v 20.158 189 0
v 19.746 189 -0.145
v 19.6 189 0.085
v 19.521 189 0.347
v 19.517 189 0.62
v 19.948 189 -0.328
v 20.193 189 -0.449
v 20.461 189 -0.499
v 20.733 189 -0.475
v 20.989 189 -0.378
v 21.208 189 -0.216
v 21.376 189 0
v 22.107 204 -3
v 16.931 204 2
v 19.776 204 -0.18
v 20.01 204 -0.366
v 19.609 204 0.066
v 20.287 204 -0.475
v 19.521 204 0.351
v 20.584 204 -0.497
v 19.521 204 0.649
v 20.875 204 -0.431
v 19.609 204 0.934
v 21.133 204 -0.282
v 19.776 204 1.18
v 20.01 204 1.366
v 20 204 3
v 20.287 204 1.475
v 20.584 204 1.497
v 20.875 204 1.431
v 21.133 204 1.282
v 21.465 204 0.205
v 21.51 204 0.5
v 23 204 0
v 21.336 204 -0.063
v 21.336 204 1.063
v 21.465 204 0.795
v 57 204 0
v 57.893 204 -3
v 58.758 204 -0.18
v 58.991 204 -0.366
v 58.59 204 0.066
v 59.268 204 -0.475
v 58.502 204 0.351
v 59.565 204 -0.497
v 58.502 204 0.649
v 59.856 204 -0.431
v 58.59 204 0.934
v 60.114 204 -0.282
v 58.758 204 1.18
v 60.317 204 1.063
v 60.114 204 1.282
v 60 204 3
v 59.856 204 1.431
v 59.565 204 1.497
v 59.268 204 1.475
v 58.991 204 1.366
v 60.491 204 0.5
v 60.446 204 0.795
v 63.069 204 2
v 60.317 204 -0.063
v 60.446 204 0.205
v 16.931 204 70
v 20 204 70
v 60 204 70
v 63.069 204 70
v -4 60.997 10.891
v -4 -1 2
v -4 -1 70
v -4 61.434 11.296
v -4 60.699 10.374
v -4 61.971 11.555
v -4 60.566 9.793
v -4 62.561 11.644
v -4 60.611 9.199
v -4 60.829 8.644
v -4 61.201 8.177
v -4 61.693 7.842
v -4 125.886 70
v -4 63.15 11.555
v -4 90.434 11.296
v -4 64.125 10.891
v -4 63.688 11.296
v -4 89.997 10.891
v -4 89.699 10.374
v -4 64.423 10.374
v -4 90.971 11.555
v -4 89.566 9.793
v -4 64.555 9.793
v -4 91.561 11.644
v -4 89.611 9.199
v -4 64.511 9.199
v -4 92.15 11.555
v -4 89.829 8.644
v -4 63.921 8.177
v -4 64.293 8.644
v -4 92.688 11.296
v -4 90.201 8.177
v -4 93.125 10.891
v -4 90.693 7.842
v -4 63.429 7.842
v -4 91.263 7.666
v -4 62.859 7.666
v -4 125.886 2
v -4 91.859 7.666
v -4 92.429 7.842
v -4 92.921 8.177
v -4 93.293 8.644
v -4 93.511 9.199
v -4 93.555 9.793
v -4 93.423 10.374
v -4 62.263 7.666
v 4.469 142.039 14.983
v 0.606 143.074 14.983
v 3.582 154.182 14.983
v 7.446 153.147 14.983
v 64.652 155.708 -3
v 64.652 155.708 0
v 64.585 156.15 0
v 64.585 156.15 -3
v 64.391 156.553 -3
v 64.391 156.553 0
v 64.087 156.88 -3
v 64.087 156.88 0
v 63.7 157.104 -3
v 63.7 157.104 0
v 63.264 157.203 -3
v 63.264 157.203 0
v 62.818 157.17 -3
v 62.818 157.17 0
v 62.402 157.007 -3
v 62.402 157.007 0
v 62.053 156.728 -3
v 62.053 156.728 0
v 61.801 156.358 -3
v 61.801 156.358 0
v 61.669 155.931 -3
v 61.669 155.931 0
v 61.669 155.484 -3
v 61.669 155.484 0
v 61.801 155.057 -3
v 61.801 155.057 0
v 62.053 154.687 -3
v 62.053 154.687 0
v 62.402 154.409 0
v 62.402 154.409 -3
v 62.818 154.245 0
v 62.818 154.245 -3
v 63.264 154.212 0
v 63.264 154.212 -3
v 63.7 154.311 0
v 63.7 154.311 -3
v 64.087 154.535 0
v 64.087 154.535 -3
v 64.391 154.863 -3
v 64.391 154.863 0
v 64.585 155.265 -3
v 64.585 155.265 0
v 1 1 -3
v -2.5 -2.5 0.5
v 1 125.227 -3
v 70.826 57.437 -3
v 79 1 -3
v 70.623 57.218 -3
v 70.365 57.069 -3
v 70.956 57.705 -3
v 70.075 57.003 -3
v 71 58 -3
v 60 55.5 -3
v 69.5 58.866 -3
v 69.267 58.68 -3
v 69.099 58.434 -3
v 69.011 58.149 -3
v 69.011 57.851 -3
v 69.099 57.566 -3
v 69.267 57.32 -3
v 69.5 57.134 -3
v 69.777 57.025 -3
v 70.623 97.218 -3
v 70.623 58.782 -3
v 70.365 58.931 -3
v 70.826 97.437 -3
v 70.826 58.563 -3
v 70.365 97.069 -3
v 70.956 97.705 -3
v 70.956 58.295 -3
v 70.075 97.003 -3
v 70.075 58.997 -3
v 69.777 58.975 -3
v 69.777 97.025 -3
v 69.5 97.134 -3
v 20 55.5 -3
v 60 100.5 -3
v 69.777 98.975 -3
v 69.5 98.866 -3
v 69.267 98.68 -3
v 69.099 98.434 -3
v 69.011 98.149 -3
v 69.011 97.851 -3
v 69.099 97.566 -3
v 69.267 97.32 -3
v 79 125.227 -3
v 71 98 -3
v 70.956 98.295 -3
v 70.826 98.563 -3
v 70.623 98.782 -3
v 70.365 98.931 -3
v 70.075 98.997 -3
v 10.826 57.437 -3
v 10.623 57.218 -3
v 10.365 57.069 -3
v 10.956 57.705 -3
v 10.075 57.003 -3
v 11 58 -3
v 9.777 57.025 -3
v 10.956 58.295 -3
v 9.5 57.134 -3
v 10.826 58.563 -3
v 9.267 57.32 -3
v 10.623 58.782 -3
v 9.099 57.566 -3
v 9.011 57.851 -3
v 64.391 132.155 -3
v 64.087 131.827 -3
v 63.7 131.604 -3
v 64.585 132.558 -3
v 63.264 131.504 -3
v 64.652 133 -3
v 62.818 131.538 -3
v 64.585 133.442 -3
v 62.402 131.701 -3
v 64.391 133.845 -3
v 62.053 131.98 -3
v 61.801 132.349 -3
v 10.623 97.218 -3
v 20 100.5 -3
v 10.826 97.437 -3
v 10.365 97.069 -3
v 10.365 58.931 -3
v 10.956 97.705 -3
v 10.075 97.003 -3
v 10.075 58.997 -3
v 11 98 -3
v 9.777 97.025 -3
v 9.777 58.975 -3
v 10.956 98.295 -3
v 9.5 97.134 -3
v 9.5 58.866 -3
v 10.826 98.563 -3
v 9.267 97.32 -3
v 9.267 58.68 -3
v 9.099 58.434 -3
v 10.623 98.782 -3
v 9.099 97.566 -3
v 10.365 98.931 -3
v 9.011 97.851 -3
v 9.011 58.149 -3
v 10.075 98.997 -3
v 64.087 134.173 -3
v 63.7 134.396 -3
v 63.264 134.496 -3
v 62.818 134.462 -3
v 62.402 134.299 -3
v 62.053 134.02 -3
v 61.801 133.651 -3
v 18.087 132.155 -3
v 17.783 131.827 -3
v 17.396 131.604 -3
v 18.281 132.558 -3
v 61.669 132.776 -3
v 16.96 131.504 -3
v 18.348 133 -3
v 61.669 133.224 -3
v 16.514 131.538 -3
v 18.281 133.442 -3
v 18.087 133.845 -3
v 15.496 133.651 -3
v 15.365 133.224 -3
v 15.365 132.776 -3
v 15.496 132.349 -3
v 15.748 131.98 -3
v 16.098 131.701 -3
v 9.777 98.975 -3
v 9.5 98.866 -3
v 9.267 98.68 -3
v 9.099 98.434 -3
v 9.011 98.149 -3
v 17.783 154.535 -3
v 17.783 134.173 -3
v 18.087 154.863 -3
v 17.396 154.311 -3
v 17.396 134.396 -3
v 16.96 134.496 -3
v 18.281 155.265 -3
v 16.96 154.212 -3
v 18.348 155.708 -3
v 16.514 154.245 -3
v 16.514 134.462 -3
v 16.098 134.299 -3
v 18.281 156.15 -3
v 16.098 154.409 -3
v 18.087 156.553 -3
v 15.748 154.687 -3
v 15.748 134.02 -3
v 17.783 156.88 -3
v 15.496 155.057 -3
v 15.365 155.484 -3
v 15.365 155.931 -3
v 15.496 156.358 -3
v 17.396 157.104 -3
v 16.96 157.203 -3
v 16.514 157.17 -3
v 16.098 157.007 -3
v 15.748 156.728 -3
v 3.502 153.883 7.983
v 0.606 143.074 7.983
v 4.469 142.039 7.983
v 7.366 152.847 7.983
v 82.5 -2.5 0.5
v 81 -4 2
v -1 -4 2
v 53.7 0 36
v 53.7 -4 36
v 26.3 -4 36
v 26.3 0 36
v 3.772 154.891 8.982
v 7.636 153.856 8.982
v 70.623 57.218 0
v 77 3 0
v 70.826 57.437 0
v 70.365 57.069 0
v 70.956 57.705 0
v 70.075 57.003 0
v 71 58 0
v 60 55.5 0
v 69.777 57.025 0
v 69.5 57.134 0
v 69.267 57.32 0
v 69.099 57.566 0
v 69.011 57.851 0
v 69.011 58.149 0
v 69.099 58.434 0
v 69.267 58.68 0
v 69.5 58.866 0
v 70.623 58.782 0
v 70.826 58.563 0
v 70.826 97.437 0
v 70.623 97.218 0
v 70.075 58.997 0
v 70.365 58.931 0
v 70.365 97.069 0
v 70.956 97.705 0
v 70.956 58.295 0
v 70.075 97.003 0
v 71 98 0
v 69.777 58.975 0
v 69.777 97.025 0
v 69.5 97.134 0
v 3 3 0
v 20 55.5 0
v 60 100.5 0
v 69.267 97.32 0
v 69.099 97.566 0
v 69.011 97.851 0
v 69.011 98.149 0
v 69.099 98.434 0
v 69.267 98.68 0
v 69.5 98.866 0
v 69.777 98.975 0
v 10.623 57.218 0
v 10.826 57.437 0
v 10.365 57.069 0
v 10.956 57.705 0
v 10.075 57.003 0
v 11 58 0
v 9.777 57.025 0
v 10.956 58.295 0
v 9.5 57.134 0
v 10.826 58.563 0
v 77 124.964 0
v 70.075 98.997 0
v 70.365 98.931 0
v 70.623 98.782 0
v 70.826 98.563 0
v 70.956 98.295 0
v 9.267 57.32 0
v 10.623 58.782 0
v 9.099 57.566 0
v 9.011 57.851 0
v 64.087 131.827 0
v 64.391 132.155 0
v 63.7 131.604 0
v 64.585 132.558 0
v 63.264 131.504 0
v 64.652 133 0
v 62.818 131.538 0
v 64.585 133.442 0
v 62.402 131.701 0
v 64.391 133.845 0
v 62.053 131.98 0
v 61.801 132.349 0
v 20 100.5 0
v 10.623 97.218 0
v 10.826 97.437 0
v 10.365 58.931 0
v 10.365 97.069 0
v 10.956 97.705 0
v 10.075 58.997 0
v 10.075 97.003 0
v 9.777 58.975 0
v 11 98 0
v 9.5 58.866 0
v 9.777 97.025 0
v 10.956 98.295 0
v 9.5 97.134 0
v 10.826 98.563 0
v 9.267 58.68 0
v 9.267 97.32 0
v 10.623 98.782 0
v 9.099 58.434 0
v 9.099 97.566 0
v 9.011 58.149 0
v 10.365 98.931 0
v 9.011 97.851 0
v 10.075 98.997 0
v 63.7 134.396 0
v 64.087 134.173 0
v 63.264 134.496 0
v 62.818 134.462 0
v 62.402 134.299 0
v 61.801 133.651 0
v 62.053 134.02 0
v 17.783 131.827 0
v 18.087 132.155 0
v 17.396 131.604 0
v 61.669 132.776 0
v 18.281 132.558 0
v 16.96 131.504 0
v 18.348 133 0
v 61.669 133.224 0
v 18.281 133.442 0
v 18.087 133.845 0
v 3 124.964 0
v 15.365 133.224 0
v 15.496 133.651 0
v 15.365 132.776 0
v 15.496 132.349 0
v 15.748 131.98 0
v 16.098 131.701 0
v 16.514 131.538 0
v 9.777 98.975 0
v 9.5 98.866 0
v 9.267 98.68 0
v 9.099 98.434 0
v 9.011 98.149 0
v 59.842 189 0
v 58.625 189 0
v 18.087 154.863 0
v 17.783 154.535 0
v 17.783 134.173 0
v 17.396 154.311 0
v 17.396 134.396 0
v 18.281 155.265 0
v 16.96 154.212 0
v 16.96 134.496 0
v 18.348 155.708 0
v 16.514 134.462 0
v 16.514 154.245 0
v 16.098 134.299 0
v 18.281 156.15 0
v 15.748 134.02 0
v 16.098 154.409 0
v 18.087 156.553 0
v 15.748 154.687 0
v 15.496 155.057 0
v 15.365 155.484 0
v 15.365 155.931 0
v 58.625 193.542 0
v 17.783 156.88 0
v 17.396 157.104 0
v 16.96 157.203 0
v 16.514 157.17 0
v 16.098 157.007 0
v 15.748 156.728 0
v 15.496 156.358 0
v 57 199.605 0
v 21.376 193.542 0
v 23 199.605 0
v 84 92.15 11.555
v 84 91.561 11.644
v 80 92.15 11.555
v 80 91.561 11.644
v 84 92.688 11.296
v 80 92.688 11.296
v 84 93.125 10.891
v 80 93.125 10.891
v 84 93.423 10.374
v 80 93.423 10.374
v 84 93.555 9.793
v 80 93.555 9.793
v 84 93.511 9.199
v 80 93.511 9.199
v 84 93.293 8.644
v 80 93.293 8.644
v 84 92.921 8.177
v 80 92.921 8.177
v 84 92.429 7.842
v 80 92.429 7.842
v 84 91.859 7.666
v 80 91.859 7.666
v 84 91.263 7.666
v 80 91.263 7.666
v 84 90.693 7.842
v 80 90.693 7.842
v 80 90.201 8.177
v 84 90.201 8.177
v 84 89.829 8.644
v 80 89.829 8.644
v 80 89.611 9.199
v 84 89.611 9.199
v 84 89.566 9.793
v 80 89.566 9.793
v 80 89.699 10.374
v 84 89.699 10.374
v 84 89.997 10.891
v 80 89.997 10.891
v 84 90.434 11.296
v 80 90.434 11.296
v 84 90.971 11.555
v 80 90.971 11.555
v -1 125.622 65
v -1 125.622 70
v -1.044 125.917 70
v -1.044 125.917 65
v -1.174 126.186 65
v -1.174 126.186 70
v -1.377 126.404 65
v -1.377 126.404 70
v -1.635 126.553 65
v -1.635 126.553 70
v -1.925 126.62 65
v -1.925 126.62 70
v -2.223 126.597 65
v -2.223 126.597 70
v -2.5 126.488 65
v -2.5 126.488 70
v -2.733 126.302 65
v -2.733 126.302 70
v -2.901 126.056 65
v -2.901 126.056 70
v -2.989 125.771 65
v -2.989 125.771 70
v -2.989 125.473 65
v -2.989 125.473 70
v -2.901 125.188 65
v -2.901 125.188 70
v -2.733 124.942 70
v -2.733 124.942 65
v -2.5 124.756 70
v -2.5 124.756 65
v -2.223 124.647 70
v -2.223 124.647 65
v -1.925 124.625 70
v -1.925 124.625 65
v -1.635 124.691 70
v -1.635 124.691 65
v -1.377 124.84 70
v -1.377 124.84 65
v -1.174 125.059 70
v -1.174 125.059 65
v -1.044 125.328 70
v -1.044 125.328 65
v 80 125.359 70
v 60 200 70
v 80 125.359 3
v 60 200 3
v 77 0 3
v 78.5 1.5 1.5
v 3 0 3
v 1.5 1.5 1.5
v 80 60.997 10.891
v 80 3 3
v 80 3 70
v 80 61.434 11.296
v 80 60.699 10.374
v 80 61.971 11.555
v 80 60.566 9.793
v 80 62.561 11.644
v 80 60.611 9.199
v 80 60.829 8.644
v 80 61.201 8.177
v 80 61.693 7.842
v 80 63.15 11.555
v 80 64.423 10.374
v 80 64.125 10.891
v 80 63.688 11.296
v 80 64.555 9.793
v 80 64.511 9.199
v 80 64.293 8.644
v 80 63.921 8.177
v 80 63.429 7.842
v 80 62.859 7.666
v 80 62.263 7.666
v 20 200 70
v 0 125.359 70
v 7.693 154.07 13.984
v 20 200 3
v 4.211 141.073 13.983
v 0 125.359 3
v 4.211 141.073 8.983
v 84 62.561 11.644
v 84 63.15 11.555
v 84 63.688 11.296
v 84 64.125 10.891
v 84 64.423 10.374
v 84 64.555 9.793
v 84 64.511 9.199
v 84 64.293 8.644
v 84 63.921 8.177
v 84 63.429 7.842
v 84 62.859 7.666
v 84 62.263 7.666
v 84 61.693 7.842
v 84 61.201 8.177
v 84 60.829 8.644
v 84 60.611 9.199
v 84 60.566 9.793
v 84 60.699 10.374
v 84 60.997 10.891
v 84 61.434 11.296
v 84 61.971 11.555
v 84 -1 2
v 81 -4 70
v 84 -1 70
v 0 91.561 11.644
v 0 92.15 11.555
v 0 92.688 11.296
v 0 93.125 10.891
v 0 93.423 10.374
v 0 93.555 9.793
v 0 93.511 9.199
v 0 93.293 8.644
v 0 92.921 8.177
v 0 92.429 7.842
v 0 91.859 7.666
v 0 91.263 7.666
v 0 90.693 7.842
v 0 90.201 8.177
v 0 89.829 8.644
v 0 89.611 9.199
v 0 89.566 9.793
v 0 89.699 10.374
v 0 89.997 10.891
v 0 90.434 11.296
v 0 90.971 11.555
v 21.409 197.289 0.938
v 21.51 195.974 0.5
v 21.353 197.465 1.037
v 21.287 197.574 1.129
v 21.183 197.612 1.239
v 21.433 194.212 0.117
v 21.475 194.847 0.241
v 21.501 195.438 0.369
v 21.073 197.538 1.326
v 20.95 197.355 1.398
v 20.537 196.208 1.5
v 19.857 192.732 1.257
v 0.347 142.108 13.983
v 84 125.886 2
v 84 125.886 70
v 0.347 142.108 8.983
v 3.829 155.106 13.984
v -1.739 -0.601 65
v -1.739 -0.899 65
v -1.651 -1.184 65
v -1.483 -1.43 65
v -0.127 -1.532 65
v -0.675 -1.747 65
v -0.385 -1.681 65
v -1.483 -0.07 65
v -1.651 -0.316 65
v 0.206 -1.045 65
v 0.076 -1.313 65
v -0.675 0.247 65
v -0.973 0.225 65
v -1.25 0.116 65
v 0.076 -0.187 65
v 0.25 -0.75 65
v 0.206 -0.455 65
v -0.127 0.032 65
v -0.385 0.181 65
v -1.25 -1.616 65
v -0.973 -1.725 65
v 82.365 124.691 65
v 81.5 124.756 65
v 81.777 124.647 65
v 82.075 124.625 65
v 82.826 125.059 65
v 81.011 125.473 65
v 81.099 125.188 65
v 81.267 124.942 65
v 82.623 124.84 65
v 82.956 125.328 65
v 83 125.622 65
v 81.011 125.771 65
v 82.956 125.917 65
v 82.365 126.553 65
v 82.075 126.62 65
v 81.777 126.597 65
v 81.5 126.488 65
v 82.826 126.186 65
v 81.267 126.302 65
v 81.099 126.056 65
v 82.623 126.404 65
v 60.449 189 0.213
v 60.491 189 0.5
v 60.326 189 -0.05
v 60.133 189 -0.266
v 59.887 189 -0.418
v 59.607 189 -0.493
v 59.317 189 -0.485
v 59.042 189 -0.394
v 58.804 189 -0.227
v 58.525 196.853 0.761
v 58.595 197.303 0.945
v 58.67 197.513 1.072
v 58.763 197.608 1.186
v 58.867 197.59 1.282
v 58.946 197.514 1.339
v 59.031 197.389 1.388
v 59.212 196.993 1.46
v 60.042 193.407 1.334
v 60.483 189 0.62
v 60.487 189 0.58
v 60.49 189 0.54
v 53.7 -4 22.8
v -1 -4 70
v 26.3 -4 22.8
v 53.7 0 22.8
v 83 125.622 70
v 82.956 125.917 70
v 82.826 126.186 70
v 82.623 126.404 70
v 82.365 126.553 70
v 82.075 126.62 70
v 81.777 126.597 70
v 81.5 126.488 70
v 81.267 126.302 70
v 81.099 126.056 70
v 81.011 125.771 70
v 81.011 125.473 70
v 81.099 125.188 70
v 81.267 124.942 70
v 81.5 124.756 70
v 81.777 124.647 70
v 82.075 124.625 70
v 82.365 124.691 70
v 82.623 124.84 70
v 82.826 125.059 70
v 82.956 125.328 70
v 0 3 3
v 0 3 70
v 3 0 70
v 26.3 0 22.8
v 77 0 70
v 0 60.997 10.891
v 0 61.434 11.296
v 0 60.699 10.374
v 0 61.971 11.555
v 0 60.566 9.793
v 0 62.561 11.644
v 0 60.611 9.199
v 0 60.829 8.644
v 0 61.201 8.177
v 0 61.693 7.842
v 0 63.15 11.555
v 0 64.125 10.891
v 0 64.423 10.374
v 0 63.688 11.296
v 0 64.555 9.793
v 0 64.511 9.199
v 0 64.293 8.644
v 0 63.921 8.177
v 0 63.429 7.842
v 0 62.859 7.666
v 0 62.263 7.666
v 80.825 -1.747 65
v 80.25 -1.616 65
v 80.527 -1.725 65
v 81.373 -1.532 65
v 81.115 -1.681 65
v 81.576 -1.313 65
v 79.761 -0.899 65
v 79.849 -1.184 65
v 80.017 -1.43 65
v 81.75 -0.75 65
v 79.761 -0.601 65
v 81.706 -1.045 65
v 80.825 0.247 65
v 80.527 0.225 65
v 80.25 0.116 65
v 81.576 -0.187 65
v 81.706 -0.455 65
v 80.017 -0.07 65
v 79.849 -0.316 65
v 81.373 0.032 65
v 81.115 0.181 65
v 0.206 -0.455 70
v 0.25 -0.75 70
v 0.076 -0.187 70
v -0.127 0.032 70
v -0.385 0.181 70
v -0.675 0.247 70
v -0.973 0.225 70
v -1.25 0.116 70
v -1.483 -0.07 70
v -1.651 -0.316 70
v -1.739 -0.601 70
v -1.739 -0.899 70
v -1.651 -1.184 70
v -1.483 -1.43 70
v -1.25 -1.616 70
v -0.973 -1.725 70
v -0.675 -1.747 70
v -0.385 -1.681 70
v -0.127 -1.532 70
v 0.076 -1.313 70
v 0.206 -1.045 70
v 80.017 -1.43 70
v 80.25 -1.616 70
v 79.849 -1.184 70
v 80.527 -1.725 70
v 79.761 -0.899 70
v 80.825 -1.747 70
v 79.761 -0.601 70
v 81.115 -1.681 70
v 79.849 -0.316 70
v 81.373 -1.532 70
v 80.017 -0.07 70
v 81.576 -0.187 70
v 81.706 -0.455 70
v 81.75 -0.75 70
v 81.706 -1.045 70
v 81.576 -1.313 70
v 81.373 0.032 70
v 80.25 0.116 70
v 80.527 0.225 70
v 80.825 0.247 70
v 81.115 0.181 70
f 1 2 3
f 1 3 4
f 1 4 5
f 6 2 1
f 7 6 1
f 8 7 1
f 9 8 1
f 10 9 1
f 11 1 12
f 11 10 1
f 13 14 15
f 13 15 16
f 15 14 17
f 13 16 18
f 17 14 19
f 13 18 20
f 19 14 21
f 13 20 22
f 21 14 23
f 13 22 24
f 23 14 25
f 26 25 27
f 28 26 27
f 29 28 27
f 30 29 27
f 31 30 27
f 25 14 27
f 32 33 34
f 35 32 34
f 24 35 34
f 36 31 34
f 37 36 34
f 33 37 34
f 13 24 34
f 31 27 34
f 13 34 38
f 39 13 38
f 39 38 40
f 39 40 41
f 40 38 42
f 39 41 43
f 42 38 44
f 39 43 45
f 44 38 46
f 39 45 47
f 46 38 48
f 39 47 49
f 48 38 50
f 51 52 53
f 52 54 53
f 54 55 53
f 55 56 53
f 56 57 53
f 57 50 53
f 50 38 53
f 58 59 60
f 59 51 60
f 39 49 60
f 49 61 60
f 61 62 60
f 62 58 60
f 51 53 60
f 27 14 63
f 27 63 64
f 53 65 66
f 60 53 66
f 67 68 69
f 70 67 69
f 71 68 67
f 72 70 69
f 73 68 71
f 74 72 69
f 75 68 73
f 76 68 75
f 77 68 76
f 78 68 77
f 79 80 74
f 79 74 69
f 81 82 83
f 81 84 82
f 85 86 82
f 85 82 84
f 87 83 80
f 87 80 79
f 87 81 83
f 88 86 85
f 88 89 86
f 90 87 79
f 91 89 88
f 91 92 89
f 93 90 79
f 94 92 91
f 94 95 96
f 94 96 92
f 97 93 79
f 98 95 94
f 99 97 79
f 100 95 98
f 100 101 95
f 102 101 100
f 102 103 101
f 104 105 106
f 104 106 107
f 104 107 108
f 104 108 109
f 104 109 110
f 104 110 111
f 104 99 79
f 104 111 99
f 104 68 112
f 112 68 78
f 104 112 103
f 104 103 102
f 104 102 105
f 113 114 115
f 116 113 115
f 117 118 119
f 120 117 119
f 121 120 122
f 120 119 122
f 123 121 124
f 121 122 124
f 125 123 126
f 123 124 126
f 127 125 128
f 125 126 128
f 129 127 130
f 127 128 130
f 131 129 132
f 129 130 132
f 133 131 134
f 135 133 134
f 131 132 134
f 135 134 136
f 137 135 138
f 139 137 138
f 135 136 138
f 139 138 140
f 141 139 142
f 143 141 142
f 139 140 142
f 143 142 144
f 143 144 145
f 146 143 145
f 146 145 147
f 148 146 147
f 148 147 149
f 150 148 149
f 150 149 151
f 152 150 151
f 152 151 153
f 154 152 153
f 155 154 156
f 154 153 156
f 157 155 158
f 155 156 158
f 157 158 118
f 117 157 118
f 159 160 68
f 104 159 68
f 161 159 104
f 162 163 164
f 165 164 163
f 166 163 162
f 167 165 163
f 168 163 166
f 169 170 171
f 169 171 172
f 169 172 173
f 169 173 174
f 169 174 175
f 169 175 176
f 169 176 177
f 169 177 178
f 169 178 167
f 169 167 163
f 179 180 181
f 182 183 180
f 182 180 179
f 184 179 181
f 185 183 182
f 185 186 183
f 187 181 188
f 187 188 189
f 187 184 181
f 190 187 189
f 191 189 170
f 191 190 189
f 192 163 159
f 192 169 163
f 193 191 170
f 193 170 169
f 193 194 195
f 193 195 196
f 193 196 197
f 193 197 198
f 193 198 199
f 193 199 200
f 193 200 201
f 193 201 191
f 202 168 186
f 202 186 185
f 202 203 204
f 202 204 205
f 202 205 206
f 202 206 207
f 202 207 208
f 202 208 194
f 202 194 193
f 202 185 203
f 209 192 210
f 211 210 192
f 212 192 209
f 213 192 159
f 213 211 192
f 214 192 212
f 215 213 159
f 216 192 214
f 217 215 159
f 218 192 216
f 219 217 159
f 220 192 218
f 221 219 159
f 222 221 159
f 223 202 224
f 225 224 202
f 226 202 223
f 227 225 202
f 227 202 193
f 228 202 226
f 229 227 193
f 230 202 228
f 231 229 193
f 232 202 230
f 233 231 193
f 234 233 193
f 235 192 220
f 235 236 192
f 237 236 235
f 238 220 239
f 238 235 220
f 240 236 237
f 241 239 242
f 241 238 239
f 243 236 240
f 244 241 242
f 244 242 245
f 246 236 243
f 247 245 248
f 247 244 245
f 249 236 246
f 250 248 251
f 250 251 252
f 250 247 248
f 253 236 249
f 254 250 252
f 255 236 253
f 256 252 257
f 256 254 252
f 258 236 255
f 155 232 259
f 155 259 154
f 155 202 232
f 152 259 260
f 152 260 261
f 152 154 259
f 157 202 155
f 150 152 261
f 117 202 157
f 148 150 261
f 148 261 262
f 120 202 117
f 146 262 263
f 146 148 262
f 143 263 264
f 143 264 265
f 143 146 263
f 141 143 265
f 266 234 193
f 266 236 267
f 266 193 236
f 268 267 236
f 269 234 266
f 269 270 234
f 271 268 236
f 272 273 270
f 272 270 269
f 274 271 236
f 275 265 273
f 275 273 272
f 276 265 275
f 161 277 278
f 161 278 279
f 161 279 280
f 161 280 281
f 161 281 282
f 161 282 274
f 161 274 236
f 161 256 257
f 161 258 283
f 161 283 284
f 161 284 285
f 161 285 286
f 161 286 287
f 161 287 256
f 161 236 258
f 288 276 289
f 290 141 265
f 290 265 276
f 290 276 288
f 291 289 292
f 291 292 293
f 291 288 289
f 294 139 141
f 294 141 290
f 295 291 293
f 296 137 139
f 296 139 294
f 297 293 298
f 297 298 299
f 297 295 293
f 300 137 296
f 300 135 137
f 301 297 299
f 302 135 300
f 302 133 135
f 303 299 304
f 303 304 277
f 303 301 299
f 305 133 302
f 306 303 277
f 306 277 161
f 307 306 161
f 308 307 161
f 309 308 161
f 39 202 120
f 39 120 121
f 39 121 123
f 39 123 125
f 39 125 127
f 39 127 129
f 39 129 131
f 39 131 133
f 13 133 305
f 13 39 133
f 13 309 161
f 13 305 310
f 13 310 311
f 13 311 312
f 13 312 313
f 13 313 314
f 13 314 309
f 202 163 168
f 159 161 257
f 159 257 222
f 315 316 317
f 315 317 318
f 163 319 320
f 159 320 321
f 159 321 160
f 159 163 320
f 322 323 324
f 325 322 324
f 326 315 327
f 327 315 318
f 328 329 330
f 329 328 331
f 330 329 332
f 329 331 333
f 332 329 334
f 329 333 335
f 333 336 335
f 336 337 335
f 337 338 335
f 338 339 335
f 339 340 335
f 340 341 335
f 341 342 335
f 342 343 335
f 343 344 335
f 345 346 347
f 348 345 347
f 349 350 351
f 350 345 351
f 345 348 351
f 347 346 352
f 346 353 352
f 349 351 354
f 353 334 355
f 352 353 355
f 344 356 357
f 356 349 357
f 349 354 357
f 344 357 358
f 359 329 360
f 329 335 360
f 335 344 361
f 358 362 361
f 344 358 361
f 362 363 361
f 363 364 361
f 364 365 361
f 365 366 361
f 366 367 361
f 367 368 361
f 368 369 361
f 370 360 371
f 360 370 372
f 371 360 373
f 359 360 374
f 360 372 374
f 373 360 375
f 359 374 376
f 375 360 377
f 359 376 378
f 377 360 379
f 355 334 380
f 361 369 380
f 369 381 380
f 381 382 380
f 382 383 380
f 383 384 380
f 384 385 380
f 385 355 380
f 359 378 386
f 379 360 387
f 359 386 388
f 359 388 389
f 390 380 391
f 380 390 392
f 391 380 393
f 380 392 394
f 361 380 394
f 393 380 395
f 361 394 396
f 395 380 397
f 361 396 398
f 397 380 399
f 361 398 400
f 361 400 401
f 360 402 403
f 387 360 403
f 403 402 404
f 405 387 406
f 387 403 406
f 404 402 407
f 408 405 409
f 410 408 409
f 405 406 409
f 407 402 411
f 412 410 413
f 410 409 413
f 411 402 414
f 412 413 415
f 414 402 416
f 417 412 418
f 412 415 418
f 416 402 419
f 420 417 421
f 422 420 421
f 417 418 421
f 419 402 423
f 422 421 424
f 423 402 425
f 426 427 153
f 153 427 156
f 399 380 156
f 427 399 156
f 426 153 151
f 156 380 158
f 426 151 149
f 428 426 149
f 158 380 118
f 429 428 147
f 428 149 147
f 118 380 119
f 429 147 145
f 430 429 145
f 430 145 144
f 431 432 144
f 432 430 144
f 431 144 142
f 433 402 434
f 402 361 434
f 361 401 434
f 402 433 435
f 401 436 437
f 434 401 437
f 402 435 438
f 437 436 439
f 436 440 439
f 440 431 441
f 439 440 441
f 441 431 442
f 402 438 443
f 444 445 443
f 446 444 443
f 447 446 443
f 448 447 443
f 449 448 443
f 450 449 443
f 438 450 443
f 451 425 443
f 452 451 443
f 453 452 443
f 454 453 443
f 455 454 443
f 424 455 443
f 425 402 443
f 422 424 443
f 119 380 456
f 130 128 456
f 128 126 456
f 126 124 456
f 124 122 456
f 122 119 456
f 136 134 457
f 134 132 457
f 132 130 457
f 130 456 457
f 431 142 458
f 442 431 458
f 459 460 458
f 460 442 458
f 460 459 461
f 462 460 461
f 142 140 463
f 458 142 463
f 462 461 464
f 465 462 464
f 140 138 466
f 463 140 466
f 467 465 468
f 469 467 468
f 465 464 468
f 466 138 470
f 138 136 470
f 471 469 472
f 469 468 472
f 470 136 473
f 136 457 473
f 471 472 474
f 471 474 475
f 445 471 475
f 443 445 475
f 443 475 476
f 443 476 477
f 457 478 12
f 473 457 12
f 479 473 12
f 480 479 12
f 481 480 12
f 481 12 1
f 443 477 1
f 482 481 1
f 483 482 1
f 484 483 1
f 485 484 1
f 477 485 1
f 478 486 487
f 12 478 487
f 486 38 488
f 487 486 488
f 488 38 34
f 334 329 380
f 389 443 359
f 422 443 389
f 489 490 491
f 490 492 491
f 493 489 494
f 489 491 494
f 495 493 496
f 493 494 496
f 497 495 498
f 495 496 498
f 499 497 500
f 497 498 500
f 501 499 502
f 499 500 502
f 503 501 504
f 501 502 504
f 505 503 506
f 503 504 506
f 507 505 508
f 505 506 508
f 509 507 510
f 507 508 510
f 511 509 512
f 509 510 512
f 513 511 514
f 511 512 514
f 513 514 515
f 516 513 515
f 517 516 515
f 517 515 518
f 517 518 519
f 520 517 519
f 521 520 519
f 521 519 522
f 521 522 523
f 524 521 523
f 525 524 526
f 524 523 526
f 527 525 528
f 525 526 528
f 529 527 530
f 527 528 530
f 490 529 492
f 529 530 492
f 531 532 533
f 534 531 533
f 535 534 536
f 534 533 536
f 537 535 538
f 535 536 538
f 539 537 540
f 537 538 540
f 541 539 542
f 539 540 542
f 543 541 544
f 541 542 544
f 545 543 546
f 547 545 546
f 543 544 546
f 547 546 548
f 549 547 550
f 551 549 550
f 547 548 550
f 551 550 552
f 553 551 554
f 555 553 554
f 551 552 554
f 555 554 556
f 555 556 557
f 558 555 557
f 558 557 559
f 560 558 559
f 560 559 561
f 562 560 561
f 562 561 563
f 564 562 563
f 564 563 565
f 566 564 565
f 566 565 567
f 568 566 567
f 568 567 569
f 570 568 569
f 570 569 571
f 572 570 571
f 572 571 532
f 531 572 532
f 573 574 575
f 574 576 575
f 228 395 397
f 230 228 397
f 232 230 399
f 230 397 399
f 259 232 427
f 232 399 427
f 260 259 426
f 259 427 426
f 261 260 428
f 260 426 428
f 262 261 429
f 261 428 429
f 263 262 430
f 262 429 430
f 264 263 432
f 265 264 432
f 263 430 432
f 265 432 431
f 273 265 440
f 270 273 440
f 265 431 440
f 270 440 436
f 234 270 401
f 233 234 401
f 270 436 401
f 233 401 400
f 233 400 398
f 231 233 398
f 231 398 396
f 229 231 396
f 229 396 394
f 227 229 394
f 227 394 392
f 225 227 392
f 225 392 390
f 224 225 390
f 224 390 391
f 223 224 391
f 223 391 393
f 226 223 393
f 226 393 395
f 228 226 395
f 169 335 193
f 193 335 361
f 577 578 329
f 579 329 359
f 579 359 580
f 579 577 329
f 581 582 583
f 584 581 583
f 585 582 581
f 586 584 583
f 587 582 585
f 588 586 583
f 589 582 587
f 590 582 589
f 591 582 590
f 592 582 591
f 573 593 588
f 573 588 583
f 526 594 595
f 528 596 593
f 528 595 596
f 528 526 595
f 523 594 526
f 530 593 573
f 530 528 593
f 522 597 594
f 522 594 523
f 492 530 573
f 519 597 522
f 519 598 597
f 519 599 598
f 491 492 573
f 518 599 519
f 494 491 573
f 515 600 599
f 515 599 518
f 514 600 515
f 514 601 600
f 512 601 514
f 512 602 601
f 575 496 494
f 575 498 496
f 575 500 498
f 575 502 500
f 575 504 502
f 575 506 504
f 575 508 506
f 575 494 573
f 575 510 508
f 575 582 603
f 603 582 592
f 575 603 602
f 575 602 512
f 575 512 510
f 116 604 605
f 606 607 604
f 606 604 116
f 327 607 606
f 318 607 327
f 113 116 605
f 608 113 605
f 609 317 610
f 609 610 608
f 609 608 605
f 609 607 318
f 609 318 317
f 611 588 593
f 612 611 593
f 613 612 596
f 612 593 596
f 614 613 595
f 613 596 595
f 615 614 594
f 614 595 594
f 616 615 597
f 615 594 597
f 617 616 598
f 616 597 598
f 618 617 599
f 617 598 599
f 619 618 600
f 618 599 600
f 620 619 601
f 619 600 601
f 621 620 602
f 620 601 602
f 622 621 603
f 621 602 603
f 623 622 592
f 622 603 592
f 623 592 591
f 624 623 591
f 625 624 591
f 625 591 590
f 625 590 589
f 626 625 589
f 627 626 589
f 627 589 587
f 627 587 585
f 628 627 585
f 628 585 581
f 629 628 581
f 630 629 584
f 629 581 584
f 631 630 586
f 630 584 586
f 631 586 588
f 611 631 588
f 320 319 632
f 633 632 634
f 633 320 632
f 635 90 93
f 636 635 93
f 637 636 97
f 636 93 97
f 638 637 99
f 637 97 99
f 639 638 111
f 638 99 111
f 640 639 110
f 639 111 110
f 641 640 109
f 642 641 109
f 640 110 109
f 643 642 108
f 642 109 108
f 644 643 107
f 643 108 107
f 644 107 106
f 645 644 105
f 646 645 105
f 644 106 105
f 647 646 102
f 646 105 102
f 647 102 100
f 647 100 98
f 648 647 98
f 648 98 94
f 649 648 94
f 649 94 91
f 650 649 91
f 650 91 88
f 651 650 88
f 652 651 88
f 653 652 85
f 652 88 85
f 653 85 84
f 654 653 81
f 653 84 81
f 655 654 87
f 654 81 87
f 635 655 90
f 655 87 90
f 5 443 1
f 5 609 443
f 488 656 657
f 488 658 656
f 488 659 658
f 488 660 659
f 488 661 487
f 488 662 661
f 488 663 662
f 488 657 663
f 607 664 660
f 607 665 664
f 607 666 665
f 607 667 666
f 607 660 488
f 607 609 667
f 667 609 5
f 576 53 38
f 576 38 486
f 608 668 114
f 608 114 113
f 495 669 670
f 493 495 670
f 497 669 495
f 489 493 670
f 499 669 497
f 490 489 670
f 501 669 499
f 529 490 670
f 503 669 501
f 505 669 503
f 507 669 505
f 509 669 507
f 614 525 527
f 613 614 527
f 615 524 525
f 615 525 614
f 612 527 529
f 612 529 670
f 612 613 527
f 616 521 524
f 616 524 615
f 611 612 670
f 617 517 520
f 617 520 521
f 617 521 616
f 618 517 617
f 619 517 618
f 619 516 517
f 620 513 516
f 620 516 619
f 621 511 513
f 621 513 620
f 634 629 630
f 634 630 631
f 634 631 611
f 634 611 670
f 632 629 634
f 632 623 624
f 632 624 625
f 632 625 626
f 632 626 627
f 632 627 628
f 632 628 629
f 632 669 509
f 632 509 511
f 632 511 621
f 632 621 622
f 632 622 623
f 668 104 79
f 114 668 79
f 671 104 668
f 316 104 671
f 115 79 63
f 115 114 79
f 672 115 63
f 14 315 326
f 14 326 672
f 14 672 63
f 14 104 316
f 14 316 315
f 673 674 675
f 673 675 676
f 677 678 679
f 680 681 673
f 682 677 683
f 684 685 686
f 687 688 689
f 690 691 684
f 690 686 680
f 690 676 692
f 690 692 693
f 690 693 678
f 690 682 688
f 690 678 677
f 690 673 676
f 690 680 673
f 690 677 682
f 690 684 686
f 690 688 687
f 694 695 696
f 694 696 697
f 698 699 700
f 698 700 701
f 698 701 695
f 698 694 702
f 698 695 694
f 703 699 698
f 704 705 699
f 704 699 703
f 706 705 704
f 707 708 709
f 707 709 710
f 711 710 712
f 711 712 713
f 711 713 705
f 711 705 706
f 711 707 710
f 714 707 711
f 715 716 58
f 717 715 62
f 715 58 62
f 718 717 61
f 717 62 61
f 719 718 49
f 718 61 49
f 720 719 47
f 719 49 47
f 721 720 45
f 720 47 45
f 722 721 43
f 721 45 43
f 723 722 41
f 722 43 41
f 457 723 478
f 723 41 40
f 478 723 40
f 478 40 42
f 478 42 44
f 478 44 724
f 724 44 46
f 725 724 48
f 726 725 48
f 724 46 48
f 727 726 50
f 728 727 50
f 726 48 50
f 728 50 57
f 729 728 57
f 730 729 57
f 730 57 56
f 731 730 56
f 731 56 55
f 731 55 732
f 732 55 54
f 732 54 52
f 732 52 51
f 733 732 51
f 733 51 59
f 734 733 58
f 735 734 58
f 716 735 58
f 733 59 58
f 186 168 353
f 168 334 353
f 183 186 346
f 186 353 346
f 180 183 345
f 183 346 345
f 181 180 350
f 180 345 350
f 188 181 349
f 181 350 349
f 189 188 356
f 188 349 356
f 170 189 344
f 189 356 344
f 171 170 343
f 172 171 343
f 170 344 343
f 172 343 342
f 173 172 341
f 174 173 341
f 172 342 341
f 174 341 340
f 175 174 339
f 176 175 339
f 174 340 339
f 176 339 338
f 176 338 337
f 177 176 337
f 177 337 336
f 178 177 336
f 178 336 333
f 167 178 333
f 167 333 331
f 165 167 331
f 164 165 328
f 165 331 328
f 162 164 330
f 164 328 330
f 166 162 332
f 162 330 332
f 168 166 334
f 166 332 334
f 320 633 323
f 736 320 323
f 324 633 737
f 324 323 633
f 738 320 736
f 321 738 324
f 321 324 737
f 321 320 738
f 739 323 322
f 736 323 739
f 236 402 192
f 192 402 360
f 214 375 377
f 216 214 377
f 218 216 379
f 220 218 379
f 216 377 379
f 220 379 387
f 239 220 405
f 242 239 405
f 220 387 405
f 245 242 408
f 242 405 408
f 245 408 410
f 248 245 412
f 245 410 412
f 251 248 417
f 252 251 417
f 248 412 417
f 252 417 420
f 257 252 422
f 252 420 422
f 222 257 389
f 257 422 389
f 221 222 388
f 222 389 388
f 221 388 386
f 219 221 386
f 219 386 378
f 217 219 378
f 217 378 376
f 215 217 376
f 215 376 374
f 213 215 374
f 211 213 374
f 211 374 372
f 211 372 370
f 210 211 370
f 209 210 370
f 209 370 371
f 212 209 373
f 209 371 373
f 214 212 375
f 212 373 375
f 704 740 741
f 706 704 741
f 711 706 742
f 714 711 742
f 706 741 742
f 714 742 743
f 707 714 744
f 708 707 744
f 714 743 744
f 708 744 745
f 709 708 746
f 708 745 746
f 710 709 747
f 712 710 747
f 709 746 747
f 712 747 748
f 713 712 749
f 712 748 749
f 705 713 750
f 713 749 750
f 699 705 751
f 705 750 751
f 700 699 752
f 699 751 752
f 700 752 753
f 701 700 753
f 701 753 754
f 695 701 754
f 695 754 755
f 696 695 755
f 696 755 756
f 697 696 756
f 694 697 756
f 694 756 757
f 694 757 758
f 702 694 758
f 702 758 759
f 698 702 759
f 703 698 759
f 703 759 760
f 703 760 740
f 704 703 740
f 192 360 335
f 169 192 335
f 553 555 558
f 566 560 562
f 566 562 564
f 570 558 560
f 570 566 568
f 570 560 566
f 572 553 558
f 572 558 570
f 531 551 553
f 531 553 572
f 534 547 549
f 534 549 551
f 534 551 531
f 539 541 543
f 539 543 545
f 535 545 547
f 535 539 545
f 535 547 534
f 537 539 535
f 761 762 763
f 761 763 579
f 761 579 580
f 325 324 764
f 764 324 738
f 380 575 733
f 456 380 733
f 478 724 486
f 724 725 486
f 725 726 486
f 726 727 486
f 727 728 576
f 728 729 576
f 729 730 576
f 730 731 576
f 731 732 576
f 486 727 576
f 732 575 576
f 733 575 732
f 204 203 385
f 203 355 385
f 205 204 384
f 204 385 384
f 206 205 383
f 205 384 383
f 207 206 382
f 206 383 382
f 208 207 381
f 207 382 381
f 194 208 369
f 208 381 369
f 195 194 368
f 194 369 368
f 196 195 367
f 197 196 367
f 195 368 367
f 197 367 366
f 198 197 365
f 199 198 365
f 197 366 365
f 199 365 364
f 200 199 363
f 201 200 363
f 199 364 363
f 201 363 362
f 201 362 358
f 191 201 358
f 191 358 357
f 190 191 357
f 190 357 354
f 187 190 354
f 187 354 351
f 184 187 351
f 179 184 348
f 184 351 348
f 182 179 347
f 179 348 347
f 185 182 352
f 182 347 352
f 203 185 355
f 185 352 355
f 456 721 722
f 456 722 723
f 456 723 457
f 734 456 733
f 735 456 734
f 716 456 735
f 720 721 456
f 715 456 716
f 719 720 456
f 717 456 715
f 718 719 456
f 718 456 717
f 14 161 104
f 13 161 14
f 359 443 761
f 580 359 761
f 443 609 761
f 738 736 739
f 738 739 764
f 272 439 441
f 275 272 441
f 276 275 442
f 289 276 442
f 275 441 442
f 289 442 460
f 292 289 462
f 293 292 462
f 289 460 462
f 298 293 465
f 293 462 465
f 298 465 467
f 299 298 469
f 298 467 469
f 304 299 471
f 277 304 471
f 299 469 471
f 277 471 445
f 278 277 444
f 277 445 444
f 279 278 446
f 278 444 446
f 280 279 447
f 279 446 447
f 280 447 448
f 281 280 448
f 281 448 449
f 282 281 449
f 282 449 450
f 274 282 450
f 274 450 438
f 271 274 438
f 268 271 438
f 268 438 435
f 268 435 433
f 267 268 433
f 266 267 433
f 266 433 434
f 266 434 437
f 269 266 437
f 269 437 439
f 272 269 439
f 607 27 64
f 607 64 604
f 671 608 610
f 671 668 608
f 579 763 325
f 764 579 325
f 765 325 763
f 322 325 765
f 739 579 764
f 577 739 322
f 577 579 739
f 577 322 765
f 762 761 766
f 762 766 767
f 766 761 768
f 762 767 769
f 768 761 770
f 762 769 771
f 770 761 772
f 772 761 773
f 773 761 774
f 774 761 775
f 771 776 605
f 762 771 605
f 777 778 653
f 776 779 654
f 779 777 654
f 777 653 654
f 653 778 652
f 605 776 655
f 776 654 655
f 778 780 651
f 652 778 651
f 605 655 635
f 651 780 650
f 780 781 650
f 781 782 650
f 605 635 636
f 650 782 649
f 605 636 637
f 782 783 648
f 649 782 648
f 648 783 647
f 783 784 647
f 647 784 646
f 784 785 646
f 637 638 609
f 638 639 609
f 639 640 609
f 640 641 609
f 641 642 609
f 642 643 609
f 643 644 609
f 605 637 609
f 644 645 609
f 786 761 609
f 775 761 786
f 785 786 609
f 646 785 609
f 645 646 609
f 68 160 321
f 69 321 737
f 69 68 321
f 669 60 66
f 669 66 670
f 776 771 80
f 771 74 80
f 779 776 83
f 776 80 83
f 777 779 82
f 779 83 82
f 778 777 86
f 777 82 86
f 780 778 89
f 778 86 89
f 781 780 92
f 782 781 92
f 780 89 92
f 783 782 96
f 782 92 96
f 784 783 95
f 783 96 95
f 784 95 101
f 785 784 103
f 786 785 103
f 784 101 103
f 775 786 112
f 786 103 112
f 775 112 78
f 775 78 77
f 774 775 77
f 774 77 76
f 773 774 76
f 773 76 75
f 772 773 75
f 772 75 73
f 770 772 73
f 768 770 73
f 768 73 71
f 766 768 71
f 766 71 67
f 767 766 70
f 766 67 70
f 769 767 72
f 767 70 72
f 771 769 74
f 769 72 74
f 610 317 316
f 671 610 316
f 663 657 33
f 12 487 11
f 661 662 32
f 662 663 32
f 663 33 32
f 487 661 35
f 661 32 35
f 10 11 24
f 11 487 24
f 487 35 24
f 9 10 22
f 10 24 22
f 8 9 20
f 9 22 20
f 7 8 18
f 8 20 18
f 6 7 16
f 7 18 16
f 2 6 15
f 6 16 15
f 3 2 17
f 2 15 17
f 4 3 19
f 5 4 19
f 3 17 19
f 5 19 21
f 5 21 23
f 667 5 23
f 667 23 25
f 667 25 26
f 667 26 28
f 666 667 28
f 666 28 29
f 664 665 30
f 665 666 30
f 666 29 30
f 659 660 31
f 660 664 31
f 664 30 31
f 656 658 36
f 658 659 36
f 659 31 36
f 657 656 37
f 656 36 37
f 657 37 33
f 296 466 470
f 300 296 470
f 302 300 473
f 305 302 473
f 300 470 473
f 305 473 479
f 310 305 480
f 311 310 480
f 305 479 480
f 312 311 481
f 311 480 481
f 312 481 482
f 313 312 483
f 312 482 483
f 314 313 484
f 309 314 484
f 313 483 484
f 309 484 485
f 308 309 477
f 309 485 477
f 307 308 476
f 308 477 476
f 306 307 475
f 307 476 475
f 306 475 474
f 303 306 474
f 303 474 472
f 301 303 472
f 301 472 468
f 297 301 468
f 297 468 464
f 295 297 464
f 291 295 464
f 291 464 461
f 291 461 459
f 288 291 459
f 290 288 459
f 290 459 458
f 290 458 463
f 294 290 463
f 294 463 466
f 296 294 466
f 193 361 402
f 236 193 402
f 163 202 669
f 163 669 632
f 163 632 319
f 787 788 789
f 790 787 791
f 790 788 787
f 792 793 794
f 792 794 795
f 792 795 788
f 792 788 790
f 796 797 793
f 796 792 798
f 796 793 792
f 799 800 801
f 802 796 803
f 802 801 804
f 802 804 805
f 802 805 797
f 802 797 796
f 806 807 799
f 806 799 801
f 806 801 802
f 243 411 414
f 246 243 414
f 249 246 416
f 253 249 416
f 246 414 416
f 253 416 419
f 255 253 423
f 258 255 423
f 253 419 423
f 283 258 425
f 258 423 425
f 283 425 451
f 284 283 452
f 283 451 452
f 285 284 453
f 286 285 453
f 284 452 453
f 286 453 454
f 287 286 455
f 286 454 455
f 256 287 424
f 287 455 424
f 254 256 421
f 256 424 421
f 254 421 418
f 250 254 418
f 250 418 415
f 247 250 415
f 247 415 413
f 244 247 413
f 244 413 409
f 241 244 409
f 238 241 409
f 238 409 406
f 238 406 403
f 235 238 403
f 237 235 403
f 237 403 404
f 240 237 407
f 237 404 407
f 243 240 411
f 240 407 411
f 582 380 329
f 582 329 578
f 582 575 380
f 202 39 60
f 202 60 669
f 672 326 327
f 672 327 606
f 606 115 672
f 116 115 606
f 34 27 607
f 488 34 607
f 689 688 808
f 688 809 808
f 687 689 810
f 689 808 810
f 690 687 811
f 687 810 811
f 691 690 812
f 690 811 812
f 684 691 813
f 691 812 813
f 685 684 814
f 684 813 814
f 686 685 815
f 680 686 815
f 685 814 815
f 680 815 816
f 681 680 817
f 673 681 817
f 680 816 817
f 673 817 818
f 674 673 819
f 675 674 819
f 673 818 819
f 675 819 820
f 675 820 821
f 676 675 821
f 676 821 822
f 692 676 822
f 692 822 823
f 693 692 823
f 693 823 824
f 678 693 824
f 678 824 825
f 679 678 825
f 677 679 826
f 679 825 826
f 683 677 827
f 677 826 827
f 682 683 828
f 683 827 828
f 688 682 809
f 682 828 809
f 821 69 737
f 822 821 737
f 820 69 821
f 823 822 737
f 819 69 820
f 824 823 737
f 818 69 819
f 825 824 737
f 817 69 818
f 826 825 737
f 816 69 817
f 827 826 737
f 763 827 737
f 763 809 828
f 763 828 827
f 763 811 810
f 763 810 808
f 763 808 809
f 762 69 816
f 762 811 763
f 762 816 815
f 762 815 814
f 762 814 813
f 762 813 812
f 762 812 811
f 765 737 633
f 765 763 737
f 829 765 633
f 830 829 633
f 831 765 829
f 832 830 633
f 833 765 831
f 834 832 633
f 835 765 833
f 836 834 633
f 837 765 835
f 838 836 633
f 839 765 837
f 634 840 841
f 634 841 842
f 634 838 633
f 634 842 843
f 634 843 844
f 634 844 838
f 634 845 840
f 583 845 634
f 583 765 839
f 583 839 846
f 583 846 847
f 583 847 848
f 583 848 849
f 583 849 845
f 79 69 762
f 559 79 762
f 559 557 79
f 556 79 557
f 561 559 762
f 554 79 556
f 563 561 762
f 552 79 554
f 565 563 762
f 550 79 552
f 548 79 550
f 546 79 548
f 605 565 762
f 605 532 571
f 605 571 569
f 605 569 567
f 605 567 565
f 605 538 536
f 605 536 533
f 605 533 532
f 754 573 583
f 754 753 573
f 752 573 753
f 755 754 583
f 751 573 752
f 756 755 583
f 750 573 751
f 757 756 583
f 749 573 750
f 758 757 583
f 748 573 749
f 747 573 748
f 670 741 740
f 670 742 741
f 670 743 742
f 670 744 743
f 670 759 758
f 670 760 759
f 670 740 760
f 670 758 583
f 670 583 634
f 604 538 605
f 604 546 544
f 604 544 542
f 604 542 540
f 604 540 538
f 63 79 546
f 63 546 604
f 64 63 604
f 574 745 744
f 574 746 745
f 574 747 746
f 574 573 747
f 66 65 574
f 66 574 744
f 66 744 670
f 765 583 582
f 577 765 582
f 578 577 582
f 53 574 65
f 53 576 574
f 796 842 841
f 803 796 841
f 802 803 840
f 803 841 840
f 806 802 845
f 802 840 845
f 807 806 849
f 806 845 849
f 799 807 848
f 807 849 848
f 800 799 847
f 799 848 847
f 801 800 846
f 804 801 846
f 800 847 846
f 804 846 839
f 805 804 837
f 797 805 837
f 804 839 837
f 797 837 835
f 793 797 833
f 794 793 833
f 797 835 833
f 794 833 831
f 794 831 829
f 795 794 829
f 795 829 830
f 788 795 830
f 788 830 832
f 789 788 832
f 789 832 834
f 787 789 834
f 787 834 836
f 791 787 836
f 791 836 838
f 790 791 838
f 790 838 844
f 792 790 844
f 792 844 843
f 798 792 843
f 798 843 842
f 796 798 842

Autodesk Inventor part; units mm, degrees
ref_plane "YZ Plane" through (0, 0, 0) normal (1, 0, 0) x (0, 1, 0)
ref_plane "XZ Plane" through (0, 0, 0) normal (0, 1, 0) x (-1, 0, 0)
ref_plane "XY Plane" through (0, 0, 0) normal (0, 0, 1) x (1, 0, 0)
sketch "Sketch1" plane through (0, 0, 0) normal (0, 0, 1) x (1, 0, 0)
  line L0 (0, 0) -> (80, 0)
  line L1 (80, 0) -> (80, 125.359)
  line L2 (60, 200) -> (80, 125.359)
  line L3 (60, 200) -> (137.2741, 200) construction
  line L4 (0, 0) -> (0, 125.359)
  line L5 (20, 200) -> (0, 125.359)
  line L6 (84, 125.8856) -> (84, -4)
  line L7 (84, -4) -> (-4, -4)
  line L8 (-4, -4) -> (-4, 125.8856)
  line L9 (-4, 125.8856) -> (16.9307, 204)
  line L10 (63.0693, 204) -> (84, 125.8856)
  line L11 (20, 204) -> (20, 200)
  line L12 (60, 200) -> (60, 204)
  line L13 (16.9307, 204) -> (20, 204)
  line L14 (60, 204) -> (63.0693, 204)
  point P0 (40, 0)
  dimension "d0" = 80
  dimension "d4" = 75
  dimension "d5" = 4
extrude "Extrusion1" add sketch "Sketch1" along normal blind 70
sketch "Sketch2" plane through (0, 0, 0) normal (0, 0, -1) x (-1, 0, 0)
  line L0 (-16.9307, 204) -> (4, 125.8856)
  line L1 (-84, 125.8856) -> (-63.0693, 204)
  line L2 (-16.9307, 204) -> (-63.0693, 204)
  line L3 (-80, 125.359) -> (-80, 0)
  line L4 (-60, 200) -> (-80, 125.359)
  line L5 (-60, 204) -> (-60, 200)
  line L6 (-63.0693, 204) -> (-60, 204)
  line L7 (-84, 125.8856) -> (-63.0693, 204)
  line L8 (-84, -4) -> (-84, 125.8856)
  line L9 (4, -4) -> (-84, -4)
  line L10 (4, 125.8856) -> (4, -4)
  line L11 (-16.9307, 204) -> (4, 125.8856)
  line L12 (-20, 204) -> (-16.9307, 204)
  line L13 (-20, 200) -> (-20, 204)
  line L14 (0, 125.359) -> (-20, 200)
  line L15 (0, 0) -> (0, 125.359)
  line L16 (-80, 0) -> (0, 0)
extrude "Extrusion2" add sketch "Sketch2" along normal blind 3
chamfer "Chamfer1" distance 5 angle 45 5 edges at (40, -4, -3) (84, 60.9428, -3) (-4, 60.9428, -3) (6.4653, 164.9428, -3) (73.5347, 164.9428, -3)
chamfer "Chamfer2" distance 3 angle 45 7 edges at (20, 202, 0) (10, 162.6795, 0) (60, 202, 0) (70, 162.6795, 0) (80, 62.6795, 0) (0, 62.6795, 0) (40, 0, 0)
chamfer "Chamfer3" distance 3 angle 45 4 edges at (84, -4, 36) (-4, -4, 36) (0, 0, 36.5) (80, 0, 36.5)
sketch "Sketch3" plane through (0, 0, 70) normal (0, 0, 1) x (1, 0, 0)
  line L0 (77, 0) -> (78.5, 1.5)
  line L1 (81, -4) -> (82.5, -2.5)
  line L2 (78.5, 1.5) -> (82.5, -2.5)
  line L3 (79, 1) -> (82.5, -2.5)
  circle A0 centre (80.75, -0.75) radius 1
  line L4 (-4, -1) -> (-2.5, -2.5)
  line L5 (-2.5, -2.5) -> (1.5, 1.5)
  line L6 (0, 3) -> (3, 0)
  line L7 (1, 1) -> (-2.5, -2.5)
  circle A1 centre (-0.75, -0.75) radius 1
  line L8 (3, 124.964) -> (0, 125.359)
  line L9 (16.9307, 204) -> (-4, 125.8856)
  line L10 (80, 125.359) -> (77, 124.964)
  line L11 (84, -1) -> (84, 125.8856)
  line L12 (1, 125.2273) -> (-4, 125.8856)
  circle A2 centre (82, 125.6223) radius 1
  circle A3 centre (-2, 125.6223) radius 1
  point P0 (0, 0)
  dimension "d19" = 2
  dimension "d20" = 2
  dimension "d22" = 2
  dimension "d23" = 2
extrude "Extrusion3" cut sketch "Sketch3" against normal blind 5
sketch "Sketch4" plane through (22.1071, 204, -3) normal (0, 1, 0) x (1, 0, 0)
  line L0 (35.7859, 0) -> (40.9622, -5)
  line L1 (38.374, -2.5) -> (36.3929, -4.5)
  line L2 (34.8929, -3) -> (37.8929, -6)
  circle A0 centre (37.3835, -3.5) radius 1
  line L3 (-21.1071, 0) -> (56.8929, 0)
  line L4 (17.8929, 0) -> (17.8929, -26)
  circle A1 centre (-1.5976, -3.5) radius 1
  point P0 (-22.1071, -3)
  dimension "d26" = 2
extrude "Extrusion4" cut sketch "Sketch4" against normal blind 15
sketch "Sketch5" plane through (0, 0, 0) normal (0, 0, 1) x (1, 0, 0)
  line L0 (77, 3) -> (3, 3)
  line L1 (40, 3) -> (40, 43)
  line L2 (40, 43) -> (40, 113)
  line L3 (40, 78) -> (20, 78)
  line L4 (20, 78) -> (20, 55.5)
  line L5 (20, 55.5) -> (60, 55.5)
  line L6 (60, 55.5) -> (60, 100.5)
  line L7 (60, 100.5) -> (20, 100.5)
  line L8 (20, 100.5) -> (20, 78)
  line L9 (40, 78) -> (70, 78)
  line L10 (70, 78) -> (70, 98)
  circle A0 centre (70, 98) radius 1
  line L11 (70, 78) -> (70, 58)
  circle A1 centre (70, 58) radius 1
  circle A2 centre (10, 98) radius 1
  circle A3 centre (10, 58) radius 1
  line L12 (40, 113) -> (40, 133)
  line L13 (40, 133) -> (63.1521, 133)
  line L14 (63.1521, 133) -> (63.1521, 155.7076)
  circle A4 centre (63.1521, 155.7076) radius 1.5
  circle A5 centre (63.1521, 133) radius 1.5
  circle A6 centre (16.8479, 155.7076) radius 1.5
  circle A7 centre (16.8479, 133) radius 1.5
  point P0 (0, 0)
  dimension "d29" = 40
  dimension "d30" = 70
  dimension "d31" = 20
  dimension "d32" = 22.5
  dimension "d33" = 40
  dimension "d34" = 45
  dimension "d35" = 30
  dimension "d36" = 20
  dimension "d37" = 2
  dimension "d38" = 20
  dimension "d39" = 2
  dimension "d40" = 20
  dimension "d41" = 23.1521
  dimension "d42" = 22.7076
  dimension "d43" = 3
  dimension "d44" = 3
extrude "Extrusion5" cut sketch "Sketch5" against normal blind 40
sketch "Sketch7" plane through (-1, -4, 2) normal (0, -1, 0) x (1, 0, 0)
  line L0 (78, 68) -> (4, 68)
  line L1 (41, 68) -> (41, 34)
  line L2 (54.7, 34) -> (27.3, 34)
  line L3 (54.7, 34) -> (54.7, 20.8)
  line L4 (54.7, 20.8) -> (27.3, 20.8)
  line L5 (27.3, 34) -> (27.3, 20.8)
  point P0 (1, -2)
  dimension "d47" = 27.4
  dimension "d48" = 34
  dimension "d49" = 13.2
extrude "Extrusion6" cut sketch "Sketch7" against normal blind 27.4
sketch "Sketch8" plane through (-4, 125.8856, 2) normal (-0.9659, 0.2588, 0) x (0, 0, 1)
  line L0 (-2, 13.7678) -> (-2, 10.7678)
  line L1 (-2, 35.7017) -> (-2, 32.7017)
  line L2 (3.9828, 34.5121) -> (3.9828, 12.5782)
  line L3 (3.9828, 23.5451) -> (5.9828, 23.5451)
  line L4 (5.9828, 23.5451) -> (12.9828, 23.5451)
  line L5 (12.9828, 23.5451) -> (12.9828, 30.2951)
  line L6 (12.9828, 30.2951) -> (12.9828, 16.7951)
  line L7 (12.9828, 16.7951) -> (5.9828, 16.7951)
  line L8 (5.9828, 16.7951) -> (5.9828, 29.9848)
  line L9 (5.9828, 29.9848) -> (12.9828, 30.2951)
  point P0 (-2, -120.5609)
  point P1 (12.9828, 30.2951)
  dimension "d52" = 2
  dimension "d53" = 7
  dimension "d54" = 6.75
  dimension "d55" = 13.5
extrude "Extrusion7" cut sketch "Sketch8" against normal blind 9
chamfer "Chamfer4" distance 1 angle 45 4 edges at (5.7728, 154.6308, 14.9828) (2.2788, 141.5908, 14.9828) (2.2788, 141.5908, 7.9828) (5.6925, 154.331, 7.9828)
sketch "Sketch9" plane through (-4, 125.8856, 2) normal (-1, 0, 0) x (0, 0, 1)
  line L0 (1, -0.5266) -> (1, -122.8856)
  line L1 (1, -48.8247) -> (7.6436, -48.8247)
  line L2 (7.6436, -48.8247) -> (7.6436, -34.3247)
  line L3 (7.6436, -34.3247) -> (7.6436, -63.3247)
  circle A0 centre (7.6436, -34.3247) radius 2
  circle A1 centre (7.6436, -63.3247) radius 2
  point P0 (-2, -125.8856)
  dimension "d61" = 14.5
  dimension "d62" = 29
  dimension "d63" = 4
  dimension "d64" = 4
extrude "Extrusion8" cut sketch "Sketch9" against normal blind 999
equation "\"d45\" = d33"
equation "\"d50\" = d47"
properties part number "the box"
